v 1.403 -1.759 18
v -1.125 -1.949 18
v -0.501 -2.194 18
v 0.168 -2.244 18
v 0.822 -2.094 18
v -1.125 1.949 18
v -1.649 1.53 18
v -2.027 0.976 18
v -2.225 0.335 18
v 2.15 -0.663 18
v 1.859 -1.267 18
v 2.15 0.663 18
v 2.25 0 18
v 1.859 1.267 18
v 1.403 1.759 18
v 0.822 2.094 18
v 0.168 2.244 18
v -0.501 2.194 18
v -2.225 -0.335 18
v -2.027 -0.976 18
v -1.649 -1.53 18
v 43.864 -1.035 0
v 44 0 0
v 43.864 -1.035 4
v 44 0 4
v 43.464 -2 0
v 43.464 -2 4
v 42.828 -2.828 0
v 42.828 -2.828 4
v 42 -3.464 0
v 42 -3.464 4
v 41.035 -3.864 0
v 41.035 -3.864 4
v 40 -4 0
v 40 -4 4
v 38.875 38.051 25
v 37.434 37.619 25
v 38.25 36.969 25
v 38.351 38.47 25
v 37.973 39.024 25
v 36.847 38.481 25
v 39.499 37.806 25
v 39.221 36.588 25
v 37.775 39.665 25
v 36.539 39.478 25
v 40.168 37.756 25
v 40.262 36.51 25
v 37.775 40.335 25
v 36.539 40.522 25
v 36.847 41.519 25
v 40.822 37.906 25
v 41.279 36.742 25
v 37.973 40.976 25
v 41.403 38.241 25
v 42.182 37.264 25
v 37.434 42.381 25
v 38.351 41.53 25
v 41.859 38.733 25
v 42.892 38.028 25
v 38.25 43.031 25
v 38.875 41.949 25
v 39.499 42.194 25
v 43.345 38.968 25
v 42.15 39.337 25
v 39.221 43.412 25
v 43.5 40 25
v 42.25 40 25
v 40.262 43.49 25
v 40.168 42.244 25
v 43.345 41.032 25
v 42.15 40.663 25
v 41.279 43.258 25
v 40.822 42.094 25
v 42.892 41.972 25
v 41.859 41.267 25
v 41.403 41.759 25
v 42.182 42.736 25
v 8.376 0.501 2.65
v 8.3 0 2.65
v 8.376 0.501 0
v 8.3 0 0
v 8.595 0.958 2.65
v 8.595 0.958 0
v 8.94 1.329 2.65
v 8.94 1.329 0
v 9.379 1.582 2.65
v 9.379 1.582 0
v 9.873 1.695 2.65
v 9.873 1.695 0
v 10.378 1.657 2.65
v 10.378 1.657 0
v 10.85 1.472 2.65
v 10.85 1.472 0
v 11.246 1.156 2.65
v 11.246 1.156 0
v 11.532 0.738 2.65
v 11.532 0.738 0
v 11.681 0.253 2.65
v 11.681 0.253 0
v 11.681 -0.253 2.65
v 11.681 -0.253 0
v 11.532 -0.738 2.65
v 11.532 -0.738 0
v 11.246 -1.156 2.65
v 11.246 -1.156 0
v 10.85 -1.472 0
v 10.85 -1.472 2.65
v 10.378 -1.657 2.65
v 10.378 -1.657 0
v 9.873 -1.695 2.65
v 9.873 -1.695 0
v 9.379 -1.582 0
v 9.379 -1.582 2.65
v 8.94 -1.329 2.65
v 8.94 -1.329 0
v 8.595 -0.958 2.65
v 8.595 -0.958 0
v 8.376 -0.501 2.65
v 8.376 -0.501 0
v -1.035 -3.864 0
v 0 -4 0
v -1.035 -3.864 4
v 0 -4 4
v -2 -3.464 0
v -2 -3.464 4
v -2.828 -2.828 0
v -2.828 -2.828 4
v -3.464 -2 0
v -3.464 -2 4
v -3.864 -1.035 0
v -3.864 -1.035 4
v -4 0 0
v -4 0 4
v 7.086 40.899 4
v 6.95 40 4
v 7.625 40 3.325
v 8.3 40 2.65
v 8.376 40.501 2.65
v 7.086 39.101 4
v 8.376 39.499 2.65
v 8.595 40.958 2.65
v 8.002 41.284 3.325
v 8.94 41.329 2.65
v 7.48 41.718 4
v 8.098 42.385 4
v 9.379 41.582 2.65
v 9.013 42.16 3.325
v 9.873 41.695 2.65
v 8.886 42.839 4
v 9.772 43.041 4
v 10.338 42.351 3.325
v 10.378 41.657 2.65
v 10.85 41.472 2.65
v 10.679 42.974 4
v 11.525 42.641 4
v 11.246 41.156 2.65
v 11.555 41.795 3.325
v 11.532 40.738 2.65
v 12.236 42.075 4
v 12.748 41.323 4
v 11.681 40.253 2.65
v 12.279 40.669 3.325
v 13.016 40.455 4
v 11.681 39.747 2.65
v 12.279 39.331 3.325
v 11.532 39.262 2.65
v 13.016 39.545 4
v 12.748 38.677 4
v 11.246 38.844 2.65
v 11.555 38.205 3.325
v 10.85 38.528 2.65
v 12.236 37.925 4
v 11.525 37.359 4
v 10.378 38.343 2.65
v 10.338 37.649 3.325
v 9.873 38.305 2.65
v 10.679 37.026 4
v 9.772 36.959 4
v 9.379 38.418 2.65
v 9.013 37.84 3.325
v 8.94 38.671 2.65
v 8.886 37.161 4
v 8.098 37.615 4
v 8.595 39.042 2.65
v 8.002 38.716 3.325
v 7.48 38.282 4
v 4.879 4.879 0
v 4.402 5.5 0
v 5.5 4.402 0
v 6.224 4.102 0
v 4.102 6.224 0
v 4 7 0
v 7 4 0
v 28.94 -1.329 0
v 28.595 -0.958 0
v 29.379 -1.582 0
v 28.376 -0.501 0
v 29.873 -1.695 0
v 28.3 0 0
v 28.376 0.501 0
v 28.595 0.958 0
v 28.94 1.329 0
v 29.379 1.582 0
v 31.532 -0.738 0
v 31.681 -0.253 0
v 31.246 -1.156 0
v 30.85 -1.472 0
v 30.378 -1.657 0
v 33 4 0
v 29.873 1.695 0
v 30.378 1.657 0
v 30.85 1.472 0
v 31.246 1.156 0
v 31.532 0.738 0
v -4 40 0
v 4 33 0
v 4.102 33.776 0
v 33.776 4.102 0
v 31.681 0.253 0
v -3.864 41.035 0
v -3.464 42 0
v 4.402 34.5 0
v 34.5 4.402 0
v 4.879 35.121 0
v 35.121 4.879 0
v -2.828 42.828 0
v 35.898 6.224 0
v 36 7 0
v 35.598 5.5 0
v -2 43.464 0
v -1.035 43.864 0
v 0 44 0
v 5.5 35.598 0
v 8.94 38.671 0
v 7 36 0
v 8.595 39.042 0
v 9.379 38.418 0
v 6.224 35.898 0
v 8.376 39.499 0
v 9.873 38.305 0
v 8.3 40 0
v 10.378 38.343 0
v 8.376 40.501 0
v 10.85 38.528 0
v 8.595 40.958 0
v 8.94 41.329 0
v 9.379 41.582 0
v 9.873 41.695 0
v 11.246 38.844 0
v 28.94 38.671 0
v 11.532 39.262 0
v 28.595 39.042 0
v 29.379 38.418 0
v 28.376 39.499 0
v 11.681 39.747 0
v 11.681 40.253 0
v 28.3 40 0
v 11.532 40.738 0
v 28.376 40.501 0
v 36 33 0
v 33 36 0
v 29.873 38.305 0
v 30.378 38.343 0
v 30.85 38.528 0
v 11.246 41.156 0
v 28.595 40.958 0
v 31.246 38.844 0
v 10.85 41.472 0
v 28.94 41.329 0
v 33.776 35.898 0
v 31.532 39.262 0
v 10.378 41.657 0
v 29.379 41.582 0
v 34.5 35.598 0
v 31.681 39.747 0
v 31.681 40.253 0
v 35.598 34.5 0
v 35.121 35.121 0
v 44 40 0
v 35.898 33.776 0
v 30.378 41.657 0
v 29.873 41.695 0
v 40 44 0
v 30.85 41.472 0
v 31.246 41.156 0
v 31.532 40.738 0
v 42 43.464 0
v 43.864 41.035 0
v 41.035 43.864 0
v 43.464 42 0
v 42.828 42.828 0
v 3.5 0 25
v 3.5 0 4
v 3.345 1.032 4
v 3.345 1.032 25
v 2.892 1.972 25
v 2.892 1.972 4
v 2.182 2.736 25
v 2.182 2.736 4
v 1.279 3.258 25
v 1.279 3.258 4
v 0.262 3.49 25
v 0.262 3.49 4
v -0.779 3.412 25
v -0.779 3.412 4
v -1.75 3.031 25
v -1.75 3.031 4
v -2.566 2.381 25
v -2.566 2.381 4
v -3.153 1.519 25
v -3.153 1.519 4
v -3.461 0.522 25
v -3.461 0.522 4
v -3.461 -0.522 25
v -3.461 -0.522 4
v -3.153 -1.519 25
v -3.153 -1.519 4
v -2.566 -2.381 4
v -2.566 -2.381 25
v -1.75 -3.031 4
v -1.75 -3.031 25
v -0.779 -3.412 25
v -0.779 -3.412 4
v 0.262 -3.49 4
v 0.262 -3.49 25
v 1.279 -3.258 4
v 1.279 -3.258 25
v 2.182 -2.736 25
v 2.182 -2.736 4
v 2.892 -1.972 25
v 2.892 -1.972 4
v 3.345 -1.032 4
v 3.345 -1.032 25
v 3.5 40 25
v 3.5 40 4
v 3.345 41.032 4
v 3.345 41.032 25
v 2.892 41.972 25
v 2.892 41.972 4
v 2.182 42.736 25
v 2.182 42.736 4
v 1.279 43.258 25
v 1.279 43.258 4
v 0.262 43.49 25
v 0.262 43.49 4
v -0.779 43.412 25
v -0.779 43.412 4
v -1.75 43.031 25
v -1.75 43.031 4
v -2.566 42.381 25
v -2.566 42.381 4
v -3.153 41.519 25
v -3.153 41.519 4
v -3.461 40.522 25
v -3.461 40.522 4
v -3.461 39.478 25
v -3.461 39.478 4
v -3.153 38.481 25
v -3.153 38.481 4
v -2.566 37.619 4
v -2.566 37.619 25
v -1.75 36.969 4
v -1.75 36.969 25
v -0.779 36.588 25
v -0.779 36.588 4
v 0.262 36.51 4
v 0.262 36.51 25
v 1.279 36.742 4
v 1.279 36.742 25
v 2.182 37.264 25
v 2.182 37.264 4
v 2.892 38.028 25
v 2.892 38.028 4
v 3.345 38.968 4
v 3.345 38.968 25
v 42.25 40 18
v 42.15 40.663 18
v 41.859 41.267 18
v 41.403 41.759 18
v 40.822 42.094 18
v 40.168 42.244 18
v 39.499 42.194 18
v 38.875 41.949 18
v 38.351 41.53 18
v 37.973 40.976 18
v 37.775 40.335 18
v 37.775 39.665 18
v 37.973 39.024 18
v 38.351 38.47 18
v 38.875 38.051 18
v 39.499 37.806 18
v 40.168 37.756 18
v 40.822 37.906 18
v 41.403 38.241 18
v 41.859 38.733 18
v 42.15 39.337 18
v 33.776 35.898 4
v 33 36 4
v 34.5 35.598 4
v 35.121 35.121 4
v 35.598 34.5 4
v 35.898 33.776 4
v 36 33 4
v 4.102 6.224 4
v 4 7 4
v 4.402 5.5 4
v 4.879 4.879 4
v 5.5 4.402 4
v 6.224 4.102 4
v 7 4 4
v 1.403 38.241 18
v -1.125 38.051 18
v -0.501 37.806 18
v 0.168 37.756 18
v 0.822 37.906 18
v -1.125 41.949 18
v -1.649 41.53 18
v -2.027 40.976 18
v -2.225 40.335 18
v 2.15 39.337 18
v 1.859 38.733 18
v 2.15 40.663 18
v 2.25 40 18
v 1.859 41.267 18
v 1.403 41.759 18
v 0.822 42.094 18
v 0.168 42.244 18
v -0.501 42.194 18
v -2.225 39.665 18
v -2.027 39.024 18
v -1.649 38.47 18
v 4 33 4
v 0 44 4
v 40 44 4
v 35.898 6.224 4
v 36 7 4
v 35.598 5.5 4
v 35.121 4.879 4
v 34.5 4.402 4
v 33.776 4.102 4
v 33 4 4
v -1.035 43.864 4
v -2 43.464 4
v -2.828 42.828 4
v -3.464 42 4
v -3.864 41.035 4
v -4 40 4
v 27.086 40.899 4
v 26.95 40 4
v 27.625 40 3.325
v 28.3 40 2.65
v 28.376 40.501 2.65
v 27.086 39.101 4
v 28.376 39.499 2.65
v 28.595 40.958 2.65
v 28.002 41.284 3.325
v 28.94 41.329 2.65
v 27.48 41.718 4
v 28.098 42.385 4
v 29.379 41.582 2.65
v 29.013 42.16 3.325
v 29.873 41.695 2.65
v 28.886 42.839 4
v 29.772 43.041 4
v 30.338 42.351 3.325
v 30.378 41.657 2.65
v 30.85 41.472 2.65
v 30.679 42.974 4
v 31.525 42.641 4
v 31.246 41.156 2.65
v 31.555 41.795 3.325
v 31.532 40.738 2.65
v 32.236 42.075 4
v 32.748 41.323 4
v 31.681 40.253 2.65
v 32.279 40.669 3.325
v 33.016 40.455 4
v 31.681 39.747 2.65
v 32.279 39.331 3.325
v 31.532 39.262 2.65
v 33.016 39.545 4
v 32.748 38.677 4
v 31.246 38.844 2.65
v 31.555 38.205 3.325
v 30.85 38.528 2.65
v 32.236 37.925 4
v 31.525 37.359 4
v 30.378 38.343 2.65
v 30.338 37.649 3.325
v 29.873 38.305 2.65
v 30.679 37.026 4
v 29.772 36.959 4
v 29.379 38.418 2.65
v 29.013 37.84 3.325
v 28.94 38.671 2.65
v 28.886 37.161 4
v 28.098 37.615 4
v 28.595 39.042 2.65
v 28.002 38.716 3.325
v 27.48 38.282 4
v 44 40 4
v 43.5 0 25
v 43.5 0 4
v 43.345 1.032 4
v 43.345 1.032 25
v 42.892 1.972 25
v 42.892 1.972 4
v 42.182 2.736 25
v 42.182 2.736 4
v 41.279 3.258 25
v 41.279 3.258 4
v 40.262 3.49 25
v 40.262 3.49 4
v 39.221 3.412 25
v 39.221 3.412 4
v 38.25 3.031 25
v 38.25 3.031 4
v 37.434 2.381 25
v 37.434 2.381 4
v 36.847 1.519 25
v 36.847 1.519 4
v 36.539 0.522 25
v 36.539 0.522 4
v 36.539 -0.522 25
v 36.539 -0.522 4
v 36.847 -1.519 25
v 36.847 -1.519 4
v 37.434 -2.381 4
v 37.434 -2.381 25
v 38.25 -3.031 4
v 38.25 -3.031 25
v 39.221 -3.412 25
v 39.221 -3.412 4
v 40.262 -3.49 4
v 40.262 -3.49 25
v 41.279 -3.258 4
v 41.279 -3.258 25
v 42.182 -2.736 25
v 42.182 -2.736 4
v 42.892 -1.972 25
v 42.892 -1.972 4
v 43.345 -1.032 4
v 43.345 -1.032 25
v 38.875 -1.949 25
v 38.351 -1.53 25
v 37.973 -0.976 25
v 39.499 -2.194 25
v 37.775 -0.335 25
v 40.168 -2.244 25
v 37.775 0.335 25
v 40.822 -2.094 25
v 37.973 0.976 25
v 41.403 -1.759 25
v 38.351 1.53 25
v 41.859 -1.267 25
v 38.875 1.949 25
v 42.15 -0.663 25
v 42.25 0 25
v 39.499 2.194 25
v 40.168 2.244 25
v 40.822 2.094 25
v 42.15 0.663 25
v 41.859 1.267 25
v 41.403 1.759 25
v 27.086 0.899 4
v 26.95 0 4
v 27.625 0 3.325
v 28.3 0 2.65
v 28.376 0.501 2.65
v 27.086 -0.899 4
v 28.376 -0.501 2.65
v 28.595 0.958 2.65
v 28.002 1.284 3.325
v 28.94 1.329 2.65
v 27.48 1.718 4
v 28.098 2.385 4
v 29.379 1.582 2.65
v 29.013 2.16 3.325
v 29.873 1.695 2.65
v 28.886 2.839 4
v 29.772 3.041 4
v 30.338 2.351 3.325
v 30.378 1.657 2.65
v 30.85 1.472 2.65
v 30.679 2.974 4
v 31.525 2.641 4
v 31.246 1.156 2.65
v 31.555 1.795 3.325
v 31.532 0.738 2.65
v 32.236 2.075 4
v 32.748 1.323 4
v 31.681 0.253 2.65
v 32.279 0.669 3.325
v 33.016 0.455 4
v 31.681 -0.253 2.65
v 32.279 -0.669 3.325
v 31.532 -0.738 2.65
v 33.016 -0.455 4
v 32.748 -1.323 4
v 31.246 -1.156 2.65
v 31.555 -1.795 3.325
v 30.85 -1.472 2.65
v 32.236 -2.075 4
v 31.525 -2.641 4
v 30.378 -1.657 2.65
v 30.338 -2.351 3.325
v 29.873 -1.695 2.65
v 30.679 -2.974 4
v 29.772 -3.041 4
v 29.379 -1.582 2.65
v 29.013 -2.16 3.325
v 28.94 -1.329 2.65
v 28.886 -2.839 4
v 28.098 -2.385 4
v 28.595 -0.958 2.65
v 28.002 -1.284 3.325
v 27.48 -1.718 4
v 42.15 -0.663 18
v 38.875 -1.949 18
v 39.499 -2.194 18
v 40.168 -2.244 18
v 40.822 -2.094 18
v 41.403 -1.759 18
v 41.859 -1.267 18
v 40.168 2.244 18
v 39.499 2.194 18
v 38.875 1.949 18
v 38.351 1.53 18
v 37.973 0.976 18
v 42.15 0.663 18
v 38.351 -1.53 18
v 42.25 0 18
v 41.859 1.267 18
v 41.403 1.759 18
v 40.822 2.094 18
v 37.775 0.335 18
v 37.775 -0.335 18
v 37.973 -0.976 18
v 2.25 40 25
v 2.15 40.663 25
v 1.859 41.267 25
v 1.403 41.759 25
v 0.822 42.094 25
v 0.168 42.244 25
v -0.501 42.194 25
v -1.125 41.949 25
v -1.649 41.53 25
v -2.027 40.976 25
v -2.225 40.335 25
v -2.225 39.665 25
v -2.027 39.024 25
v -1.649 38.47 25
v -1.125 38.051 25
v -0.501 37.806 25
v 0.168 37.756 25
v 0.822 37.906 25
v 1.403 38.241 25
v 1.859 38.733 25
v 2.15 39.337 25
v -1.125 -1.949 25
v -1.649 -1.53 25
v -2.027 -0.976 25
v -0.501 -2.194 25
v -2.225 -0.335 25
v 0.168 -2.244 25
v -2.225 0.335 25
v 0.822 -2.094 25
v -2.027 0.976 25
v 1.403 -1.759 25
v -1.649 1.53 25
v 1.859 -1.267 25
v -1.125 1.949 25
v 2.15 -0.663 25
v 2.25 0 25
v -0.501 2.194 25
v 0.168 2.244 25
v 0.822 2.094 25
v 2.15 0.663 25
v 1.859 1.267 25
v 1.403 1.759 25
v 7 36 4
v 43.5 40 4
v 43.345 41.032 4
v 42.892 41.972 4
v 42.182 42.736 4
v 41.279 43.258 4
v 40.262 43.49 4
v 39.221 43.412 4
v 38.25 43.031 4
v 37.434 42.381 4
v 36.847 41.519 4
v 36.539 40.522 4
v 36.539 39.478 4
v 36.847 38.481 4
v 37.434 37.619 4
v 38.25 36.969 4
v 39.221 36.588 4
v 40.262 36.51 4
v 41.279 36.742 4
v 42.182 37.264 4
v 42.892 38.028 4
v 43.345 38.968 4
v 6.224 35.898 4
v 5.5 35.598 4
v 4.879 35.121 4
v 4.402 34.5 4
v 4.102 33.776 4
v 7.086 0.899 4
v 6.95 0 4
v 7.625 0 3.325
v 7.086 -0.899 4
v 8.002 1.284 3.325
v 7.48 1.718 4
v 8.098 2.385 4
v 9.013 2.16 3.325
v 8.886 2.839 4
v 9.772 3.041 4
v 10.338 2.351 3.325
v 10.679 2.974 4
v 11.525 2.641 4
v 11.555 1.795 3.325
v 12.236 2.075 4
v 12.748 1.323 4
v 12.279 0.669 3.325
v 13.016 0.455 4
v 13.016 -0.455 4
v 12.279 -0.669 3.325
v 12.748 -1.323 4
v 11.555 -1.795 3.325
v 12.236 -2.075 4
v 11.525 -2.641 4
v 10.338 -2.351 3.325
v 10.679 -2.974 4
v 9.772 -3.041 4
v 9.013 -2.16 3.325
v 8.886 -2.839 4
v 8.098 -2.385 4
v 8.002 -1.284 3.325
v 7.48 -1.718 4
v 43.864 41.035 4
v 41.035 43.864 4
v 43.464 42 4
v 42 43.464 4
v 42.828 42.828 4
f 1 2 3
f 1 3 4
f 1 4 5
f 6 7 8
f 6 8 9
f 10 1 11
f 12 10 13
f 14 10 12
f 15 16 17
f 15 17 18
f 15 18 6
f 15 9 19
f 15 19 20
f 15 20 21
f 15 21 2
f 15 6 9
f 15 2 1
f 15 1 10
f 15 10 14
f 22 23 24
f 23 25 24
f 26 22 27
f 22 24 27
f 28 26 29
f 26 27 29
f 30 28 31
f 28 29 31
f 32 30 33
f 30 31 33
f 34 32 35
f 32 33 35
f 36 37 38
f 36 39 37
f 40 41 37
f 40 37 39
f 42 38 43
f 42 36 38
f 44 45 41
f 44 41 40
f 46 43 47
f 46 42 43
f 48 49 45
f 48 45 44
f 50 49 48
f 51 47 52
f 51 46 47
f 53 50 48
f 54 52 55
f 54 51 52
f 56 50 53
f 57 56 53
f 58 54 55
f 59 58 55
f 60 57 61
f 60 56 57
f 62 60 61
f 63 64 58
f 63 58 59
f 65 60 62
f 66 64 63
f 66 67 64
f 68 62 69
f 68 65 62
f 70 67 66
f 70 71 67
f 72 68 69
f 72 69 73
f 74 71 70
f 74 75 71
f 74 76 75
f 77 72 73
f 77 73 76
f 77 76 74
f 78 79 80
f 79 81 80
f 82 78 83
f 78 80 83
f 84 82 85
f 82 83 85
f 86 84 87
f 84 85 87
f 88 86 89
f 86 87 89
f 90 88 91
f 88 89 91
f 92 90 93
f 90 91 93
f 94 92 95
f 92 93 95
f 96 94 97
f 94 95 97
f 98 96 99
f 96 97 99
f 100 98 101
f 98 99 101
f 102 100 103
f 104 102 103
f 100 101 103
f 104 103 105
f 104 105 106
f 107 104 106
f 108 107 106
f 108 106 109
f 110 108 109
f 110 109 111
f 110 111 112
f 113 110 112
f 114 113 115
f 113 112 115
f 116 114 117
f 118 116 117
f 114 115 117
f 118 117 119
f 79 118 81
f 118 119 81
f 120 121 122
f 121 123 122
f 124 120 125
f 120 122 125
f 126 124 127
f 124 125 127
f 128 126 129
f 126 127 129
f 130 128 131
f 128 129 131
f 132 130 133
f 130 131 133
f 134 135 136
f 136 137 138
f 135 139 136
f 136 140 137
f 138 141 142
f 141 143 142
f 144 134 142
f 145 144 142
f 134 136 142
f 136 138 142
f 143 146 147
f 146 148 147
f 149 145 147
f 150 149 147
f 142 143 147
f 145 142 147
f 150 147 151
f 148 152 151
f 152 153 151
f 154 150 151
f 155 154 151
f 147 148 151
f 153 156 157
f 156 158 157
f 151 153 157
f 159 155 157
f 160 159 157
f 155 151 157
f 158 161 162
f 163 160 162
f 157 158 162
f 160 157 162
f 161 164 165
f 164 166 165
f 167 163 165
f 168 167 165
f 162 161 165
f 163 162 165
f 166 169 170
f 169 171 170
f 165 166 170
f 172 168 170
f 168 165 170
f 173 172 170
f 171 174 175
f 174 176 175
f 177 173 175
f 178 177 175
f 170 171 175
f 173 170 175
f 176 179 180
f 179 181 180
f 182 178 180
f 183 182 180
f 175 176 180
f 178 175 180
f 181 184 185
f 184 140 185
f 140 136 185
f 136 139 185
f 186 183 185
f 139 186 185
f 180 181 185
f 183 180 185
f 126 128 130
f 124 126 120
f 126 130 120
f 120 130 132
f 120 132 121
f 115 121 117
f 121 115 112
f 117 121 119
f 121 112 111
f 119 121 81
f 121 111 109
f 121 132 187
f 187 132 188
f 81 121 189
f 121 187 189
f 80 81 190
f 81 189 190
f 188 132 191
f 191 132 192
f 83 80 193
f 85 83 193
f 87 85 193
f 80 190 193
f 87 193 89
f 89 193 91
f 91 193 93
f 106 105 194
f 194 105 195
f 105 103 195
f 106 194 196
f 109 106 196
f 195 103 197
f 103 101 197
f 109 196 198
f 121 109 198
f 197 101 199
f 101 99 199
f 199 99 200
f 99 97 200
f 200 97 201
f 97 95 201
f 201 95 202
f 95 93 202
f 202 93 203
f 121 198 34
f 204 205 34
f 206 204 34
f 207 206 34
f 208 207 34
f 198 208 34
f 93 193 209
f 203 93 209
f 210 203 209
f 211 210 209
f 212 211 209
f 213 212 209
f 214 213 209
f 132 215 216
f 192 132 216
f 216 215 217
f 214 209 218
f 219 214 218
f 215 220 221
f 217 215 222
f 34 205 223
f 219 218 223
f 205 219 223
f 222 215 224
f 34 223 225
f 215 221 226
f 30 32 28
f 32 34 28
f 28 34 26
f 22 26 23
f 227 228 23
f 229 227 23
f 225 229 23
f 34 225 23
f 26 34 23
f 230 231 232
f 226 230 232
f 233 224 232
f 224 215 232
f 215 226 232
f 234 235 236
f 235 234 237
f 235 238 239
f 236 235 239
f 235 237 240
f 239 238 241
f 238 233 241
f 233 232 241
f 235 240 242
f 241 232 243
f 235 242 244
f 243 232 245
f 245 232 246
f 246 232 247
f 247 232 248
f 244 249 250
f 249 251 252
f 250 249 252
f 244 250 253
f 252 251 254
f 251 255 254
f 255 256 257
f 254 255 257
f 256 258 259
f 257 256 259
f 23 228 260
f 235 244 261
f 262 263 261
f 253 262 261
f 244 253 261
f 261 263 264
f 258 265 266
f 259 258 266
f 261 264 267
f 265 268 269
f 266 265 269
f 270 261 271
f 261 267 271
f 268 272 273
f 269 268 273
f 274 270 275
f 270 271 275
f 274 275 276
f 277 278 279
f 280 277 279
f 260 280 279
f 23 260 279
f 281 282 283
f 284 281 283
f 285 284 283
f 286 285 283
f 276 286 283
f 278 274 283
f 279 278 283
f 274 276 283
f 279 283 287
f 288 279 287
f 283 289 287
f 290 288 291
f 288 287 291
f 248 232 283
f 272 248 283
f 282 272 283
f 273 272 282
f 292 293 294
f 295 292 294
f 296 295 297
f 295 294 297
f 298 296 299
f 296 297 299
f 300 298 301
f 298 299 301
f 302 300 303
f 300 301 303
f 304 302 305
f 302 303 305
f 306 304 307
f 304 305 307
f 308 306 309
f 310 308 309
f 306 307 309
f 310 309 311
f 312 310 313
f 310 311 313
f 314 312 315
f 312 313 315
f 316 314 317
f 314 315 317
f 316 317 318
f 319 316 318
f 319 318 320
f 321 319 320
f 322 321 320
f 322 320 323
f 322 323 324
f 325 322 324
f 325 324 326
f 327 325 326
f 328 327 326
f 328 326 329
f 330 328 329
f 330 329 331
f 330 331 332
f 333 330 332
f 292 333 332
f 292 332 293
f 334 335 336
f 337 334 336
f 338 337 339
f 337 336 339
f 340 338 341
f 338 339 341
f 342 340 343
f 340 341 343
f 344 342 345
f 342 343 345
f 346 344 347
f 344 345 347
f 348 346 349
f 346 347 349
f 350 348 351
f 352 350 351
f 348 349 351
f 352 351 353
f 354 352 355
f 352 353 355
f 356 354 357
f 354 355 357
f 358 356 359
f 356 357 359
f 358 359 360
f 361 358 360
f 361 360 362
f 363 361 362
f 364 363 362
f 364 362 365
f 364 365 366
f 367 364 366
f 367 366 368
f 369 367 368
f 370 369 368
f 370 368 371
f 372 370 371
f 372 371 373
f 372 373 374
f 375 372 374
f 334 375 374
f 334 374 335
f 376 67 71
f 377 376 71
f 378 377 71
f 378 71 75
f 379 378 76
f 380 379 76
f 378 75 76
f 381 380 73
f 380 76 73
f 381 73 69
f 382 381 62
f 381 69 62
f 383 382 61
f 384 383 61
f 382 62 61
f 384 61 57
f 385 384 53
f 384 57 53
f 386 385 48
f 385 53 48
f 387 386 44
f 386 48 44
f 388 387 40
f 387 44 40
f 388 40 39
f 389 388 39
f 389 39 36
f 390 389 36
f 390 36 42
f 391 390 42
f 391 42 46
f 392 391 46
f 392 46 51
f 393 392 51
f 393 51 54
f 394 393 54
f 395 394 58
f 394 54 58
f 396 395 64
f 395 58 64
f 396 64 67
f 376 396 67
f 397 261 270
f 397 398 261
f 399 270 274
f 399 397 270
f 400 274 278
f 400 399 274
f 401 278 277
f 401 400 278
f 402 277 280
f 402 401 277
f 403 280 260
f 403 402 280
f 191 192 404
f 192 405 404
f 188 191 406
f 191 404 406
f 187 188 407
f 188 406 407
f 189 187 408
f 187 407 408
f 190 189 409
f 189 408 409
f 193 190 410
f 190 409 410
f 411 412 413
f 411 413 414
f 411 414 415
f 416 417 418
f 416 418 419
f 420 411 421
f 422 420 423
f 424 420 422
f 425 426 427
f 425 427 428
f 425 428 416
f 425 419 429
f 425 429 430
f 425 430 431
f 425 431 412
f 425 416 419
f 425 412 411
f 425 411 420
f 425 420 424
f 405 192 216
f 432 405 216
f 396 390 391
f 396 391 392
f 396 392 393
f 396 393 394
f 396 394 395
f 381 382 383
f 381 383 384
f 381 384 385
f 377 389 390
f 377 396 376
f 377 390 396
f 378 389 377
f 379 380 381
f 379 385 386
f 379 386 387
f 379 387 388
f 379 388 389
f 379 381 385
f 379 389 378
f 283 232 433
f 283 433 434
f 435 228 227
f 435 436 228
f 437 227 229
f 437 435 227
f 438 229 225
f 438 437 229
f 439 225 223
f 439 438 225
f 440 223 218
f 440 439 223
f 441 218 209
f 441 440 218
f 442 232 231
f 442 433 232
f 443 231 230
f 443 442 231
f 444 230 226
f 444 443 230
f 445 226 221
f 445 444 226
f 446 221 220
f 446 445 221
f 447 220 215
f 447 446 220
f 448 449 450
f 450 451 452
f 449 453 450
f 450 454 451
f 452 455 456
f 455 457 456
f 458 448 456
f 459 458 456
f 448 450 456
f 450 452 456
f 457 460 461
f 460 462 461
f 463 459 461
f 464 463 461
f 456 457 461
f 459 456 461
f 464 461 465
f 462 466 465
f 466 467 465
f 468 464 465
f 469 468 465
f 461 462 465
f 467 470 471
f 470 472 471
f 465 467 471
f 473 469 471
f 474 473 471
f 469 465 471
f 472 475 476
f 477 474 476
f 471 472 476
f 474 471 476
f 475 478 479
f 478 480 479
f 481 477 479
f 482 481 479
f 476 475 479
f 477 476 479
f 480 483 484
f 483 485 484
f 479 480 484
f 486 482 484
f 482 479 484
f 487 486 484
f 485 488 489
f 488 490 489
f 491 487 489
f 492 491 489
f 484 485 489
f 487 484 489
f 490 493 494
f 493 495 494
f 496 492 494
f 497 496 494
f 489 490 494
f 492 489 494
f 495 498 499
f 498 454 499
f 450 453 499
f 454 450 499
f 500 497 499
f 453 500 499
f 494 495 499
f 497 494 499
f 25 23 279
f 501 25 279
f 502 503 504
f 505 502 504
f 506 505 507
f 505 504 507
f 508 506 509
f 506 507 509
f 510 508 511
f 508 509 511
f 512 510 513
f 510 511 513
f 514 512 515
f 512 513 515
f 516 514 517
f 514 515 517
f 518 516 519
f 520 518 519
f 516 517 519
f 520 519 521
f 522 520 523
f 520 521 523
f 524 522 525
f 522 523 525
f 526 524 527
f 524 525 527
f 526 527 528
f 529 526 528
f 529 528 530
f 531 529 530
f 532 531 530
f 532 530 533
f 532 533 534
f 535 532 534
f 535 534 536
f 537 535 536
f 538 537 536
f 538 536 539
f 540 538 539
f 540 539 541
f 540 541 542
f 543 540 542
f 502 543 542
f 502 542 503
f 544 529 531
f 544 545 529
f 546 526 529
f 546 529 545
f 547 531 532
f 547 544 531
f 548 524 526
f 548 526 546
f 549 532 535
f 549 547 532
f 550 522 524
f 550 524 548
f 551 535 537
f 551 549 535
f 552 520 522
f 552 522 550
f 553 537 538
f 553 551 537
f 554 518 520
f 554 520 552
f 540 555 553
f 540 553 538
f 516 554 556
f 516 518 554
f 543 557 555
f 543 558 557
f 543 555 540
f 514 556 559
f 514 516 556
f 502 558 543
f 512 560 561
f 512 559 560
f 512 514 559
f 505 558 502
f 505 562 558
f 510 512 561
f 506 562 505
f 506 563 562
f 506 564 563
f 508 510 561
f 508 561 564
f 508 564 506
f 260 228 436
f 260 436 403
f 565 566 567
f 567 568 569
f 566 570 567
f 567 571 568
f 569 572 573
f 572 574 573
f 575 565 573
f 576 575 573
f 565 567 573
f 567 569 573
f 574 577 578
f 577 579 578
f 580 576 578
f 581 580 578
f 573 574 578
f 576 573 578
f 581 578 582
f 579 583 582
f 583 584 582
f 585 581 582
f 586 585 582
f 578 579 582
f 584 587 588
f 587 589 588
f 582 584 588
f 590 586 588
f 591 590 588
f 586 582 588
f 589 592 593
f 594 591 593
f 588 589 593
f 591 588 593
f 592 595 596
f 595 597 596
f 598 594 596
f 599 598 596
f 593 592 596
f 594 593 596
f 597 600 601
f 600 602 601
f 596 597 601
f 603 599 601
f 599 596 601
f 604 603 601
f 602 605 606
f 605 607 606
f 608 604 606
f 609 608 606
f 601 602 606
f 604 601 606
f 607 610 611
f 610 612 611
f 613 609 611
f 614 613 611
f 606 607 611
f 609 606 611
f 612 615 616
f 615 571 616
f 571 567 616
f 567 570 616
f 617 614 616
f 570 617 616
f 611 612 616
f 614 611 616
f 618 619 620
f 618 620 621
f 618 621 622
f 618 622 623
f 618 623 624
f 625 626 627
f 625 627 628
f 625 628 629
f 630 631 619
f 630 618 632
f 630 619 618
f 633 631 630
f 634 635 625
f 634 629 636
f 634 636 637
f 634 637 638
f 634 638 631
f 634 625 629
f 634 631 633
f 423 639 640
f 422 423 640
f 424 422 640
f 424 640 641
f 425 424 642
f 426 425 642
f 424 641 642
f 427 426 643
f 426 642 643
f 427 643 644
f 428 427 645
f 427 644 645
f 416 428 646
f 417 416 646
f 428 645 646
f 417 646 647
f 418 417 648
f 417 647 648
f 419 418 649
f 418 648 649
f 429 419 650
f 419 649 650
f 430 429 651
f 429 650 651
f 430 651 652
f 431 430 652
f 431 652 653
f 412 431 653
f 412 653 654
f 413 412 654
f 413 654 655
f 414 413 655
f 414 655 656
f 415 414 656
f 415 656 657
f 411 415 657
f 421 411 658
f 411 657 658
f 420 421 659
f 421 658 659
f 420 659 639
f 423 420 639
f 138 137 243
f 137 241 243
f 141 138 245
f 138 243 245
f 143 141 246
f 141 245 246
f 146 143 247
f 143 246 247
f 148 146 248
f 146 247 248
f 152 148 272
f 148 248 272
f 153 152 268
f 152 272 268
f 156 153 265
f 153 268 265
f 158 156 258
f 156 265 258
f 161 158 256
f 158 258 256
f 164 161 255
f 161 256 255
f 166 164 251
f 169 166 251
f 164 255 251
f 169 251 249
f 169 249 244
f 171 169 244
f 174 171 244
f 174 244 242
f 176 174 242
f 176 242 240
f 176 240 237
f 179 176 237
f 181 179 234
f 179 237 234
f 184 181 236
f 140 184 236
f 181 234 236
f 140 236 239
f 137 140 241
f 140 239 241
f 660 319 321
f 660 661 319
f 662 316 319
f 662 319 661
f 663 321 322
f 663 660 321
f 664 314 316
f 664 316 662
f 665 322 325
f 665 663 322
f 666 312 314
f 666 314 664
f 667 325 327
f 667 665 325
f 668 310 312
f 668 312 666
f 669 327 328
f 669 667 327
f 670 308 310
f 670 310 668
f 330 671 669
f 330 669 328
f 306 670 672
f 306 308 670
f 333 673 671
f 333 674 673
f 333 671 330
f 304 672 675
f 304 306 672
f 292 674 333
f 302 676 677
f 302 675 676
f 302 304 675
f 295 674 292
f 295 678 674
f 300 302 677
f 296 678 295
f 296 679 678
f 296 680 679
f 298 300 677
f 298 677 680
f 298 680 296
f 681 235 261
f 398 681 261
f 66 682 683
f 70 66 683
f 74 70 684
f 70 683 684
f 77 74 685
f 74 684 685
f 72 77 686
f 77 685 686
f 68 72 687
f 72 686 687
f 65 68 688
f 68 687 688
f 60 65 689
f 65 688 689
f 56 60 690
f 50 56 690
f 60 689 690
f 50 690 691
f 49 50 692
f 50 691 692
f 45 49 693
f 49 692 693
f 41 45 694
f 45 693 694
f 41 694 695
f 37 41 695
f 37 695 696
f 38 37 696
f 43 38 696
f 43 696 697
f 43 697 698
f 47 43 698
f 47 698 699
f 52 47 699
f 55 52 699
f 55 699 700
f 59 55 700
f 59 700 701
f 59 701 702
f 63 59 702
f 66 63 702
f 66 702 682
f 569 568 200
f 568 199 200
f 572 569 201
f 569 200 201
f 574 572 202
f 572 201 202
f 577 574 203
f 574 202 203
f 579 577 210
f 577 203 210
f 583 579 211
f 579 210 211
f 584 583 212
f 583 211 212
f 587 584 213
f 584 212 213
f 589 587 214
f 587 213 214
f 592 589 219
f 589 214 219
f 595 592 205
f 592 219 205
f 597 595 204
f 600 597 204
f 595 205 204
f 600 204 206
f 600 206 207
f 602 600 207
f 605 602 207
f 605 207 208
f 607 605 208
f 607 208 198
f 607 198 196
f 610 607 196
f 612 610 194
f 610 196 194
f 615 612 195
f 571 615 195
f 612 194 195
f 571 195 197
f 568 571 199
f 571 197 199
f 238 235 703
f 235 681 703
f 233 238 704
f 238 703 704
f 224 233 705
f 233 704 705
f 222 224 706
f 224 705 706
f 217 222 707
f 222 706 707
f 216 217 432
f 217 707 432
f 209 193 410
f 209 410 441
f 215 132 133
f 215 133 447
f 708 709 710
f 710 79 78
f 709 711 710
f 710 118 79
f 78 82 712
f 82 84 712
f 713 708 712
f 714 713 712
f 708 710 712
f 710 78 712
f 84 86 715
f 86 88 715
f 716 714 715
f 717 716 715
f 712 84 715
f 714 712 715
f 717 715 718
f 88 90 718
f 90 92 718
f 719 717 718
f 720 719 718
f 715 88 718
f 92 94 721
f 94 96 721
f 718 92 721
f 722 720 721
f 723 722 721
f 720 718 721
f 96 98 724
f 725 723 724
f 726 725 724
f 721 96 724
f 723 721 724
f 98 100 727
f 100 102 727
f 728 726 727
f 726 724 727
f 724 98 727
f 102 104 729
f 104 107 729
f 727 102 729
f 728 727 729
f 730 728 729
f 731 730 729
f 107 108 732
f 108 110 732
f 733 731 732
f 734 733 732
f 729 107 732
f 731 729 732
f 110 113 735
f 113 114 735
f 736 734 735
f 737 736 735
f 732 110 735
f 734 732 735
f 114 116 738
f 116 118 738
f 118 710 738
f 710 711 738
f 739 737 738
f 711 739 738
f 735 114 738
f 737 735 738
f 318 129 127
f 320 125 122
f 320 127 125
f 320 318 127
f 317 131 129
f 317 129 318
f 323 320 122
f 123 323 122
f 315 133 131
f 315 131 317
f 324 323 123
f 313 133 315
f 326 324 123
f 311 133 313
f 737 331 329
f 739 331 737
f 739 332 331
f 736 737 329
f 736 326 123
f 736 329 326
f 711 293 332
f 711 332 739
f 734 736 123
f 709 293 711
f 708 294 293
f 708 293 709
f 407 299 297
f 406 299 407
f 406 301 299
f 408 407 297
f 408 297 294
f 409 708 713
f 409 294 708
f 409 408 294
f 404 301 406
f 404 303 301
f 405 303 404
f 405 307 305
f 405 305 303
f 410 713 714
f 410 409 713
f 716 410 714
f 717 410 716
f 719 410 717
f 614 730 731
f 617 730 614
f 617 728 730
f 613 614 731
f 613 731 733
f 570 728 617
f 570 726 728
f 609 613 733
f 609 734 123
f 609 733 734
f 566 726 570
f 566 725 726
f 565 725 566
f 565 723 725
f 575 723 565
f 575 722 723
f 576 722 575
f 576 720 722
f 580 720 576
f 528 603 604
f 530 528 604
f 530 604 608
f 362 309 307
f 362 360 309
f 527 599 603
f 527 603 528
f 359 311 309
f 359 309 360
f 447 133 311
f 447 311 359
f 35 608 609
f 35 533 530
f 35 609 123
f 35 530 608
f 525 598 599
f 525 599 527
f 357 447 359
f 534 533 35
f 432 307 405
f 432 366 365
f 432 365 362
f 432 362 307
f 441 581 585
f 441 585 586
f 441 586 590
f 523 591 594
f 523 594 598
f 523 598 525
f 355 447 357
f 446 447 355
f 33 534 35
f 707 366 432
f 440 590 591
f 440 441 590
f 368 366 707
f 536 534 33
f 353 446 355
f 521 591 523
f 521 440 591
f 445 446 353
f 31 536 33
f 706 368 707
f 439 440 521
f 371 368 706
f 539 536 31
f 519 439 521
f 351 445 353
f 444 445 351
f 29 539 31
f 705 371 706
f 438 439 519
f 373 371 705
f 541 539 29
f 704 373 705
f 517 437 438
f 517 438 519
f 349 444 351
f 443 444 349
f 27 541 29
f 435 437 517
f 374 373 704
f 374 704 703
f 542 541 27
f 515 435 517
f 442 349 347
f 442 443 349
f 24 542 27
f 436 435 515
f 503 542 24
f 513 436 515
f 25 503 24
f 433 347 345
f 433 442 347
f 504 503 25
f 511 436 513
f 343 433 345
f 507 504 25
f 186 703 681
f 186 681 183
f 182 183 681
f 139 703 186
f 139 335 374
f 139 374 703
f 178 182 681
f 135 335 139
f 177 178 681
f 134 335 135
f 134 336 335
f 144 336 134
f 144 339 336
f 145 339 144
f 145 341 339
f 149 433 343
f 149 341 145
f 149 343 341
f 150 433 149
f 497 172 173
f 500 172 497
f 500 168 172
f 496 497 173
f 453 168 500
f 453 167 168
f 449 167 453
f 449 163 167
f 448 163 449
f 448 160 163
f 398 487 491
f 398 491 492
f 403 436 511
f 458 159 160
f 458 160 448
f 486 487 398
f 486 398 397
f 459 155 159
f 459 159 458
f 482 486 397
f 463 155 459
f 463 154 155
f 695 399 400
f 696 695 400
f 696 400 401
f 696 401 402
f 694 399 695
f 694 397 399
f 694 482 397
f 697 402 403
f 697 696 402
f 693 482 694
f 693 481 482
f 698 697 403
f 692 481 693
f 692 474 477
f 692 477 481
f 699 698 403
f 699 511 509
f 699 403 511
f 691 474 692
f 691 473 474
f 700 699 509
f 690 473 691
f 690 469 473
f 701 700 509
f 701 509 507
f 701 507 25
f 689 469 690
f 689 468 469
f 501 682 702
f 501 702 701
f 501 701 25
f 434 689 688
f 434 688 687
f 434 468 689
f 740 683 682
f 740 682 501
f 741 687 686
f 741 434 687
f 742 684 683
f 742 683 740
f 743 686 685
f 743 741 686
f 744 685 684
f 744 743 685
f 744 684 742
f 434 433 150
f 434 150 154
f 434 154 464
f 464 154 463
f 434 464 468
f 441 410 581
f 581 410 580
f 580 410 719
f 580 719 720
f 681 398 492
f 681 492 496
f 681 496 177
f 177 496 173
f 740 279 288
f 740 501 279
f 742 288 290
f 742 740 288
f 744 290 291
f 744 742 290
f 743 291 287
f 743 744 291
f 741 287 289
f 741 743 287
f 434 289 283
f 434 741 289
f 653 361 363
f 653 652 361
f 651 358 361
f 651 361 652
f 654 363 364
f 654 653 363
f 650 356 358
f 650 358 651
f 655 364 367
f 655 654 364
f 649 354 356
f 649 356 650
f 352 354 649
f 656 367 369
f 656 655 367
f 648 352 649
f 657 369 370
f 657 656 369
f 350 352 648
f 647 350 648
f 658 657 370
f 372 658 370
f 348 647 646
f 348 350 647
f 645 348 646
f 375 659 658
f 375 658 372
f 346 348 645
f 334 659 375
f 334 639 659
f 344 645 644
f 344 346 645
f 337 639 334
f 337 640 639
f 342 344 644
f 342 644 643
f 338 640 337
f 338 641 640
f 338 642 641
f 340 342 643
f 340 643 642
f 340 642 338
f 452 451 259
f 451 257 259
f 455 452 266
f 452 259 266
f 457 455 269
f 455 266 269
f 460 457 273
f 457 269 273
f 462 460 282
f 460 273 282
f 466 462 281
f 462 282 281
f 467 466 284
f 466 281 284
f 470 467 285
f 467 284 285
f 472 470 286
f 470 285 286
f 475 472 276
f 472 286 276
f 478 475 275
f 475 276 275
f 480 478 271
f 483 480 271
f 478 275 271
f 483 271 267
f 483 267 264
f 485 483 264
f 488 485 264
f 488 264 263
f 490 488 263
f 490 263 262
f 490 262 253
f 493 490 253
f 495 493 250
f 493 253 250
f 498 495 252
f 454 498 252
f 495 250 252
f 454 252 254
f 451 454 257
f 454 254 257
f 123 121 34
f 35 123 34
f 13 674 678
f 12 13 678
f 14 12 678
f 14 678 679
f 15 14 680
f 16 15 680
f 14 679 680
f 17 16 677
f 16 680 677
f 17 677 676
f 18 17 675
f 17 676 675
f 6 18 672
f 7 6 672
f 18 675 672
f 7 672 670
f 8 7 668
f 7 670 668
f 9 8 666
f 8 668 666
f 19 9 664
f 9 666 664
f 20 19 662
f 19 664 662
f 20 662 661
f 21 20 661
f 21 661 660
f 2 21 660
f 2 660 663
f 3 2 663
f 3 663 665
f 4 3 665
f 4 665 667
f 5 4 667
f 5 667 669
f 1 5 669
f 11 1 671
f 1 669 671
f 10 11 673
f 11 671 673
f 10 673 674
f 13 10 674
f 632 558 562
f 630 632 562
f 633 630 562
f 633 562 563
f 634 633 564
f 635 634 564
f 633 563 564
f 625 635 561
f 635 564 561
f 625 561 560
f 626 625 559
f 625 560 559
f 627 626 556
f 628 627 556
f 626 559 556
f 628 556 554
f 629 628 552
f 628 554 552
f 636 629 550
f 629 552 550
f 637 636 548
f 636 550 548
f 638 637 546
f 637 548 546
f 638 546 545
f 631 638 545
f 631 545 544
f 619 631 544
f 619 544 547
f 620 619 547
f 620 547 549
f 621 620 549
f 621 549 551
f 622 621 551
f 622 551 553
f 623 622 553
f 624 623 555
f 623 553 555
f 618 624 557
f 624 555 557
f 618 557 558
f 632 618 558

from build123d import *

# Parameters (mm, degrees)
SKETCH005_R                        = 3.5
PAD003_DEPTH                       = 25
SKETCH007_W                        = 48
SKETCH007_H                        = 48
SKETCH007_W_2                      = 32
SKETCH007_H_2                      = 32
PAD004_DEPTH                       = 4
SKETCH006_R                        = 2.25
POCKET001_DEPTH                    = 7
SKETCH005_LINEARPATTERN002_2_R     = 3.5
PAD003_LINEARPATTERN002_2_DEPTH    = 25
SKETCH006_LINEARPATTERN002_2_R     = 2.25
POCKET001_LINEARPATTERN002_2_DEPTH = 7
LINEARPATTERN003_COUNT             = 2
LINEARPATTERN003_PITCH             = 40
HOLE001_D                          = 3.4
HOLE001_DEPTH                      = 25
HOLE001_CSINK_D                    = 6.1
HOLE001_CSINK_ANGLE                = 90
FILLET002_R                        = 4
FILLET003_R                        = 3


with BuildPart() as part:
    # Sketch005 → Pad003 (new body)
    with BuildSketch(Plane.XY):
        Circle(SKETCH005_R)
    pad003 = extrude(amount=PAD003_DEPTH)

    # Sketch007 → Pad004 (join)
    with BuildSketch(Plane.XY):
        with Locations((20, 20)):
            Rectangle(SKETCH007_W, SKETCH007_H)
        with Locations((20, 20)):
            Rectangle(SKETCH007_W_2, SKETCH007_H_2, mode=Mode.SUBTRACT)
    extrude(amount=PAD004_DEPTH)

    # Sketch006 → Pocket001 (cut)
    with BuildSketch(Plane.XY.offset(25)):
        Circle(SKETCH006_R)
    pocket001 = extrude(amount=-POCKET001_DEPTH, mode=Mode.SUBTRACT)

    # Sketch005 LinearPattern002 2 → Pad003 LinearPattern002 2 (add)
    with BuildSketch(Plane(origin=(40, 0, 0), x_dir=(1, 0, 0), z_dir=(0, 0, 1))):
        Circle(SKETCH005_LINEARPATTERN002_2_R)
    pad003_linearpattern002_2 = extrude(amount=PAD003_LINEARPATTERN002_2_DEPTH)

    # Sketch006 LinearPattern002 2 → Pocket001 LinearPattern002 2 (cut)
    with BuildSketch(Plane(origin=(40, 0, 25), x_dir=(1, 0, 0), z_dir=(0, 0, 1))):
        Circle(SKETCH006_LINEARPATTERN002_2_R)
    pocket001_linearpattern002_2 = extrude(amount=-POCKET001_LINEARPATTERN002_2_DEPTH, mode=Mode.SUBTRACT)

    # LinearPattern003: Pad003, Pocket001, Pad003 LinearPattern002 2, Pocket001 LinearPattern002 2 ×2
    with Locations(*[(0, i * LINEARPATTERN003_PITCH, 0) for i in range(1, LINEARPATTERN003_COUNT)]):
        add(pad003)
        add(pocket001, mode=Mode.SUBTRACT)
        add(pad003_linearpattern002_2)
        add(pocket001_linearpattern002_2, mode=Mode.SUBTRACT)

    # Hole001
    with Locations(Plane.XY.offset(4)):
        with Locations((10, 40), (30, 40), (30, 0), (10, 0)):
            CounterSinkHole(HOLE001_D / 2, HOLE001_CSINK_D / 2, depth=HOLE001_DEPTH, counter_sink_angle=HOLE001_CSINK_ANGLE)

    # Fillet002
    fillet002_edges = [part.edges().sort_by_distance(p)[0] for p in [
        (-4, -4, 2),
        (44, -4, 2),
        (-4, 44, 2),
        (44, 44, 2),
    ]]
    fillet(fillet002_edges, radius=FILLET002_R)

    # Fillet003
    fillet003_edges = [part.edges().sort_by_distance(p)[0] for p in [
        (4, 36, 2),
        (36, 36, 2),
        (36, 4, 2),
        (4, 4, 2),
    ]]
    fillet(fillet003_edges, radius=FILLET003_R)


solid = part.part
